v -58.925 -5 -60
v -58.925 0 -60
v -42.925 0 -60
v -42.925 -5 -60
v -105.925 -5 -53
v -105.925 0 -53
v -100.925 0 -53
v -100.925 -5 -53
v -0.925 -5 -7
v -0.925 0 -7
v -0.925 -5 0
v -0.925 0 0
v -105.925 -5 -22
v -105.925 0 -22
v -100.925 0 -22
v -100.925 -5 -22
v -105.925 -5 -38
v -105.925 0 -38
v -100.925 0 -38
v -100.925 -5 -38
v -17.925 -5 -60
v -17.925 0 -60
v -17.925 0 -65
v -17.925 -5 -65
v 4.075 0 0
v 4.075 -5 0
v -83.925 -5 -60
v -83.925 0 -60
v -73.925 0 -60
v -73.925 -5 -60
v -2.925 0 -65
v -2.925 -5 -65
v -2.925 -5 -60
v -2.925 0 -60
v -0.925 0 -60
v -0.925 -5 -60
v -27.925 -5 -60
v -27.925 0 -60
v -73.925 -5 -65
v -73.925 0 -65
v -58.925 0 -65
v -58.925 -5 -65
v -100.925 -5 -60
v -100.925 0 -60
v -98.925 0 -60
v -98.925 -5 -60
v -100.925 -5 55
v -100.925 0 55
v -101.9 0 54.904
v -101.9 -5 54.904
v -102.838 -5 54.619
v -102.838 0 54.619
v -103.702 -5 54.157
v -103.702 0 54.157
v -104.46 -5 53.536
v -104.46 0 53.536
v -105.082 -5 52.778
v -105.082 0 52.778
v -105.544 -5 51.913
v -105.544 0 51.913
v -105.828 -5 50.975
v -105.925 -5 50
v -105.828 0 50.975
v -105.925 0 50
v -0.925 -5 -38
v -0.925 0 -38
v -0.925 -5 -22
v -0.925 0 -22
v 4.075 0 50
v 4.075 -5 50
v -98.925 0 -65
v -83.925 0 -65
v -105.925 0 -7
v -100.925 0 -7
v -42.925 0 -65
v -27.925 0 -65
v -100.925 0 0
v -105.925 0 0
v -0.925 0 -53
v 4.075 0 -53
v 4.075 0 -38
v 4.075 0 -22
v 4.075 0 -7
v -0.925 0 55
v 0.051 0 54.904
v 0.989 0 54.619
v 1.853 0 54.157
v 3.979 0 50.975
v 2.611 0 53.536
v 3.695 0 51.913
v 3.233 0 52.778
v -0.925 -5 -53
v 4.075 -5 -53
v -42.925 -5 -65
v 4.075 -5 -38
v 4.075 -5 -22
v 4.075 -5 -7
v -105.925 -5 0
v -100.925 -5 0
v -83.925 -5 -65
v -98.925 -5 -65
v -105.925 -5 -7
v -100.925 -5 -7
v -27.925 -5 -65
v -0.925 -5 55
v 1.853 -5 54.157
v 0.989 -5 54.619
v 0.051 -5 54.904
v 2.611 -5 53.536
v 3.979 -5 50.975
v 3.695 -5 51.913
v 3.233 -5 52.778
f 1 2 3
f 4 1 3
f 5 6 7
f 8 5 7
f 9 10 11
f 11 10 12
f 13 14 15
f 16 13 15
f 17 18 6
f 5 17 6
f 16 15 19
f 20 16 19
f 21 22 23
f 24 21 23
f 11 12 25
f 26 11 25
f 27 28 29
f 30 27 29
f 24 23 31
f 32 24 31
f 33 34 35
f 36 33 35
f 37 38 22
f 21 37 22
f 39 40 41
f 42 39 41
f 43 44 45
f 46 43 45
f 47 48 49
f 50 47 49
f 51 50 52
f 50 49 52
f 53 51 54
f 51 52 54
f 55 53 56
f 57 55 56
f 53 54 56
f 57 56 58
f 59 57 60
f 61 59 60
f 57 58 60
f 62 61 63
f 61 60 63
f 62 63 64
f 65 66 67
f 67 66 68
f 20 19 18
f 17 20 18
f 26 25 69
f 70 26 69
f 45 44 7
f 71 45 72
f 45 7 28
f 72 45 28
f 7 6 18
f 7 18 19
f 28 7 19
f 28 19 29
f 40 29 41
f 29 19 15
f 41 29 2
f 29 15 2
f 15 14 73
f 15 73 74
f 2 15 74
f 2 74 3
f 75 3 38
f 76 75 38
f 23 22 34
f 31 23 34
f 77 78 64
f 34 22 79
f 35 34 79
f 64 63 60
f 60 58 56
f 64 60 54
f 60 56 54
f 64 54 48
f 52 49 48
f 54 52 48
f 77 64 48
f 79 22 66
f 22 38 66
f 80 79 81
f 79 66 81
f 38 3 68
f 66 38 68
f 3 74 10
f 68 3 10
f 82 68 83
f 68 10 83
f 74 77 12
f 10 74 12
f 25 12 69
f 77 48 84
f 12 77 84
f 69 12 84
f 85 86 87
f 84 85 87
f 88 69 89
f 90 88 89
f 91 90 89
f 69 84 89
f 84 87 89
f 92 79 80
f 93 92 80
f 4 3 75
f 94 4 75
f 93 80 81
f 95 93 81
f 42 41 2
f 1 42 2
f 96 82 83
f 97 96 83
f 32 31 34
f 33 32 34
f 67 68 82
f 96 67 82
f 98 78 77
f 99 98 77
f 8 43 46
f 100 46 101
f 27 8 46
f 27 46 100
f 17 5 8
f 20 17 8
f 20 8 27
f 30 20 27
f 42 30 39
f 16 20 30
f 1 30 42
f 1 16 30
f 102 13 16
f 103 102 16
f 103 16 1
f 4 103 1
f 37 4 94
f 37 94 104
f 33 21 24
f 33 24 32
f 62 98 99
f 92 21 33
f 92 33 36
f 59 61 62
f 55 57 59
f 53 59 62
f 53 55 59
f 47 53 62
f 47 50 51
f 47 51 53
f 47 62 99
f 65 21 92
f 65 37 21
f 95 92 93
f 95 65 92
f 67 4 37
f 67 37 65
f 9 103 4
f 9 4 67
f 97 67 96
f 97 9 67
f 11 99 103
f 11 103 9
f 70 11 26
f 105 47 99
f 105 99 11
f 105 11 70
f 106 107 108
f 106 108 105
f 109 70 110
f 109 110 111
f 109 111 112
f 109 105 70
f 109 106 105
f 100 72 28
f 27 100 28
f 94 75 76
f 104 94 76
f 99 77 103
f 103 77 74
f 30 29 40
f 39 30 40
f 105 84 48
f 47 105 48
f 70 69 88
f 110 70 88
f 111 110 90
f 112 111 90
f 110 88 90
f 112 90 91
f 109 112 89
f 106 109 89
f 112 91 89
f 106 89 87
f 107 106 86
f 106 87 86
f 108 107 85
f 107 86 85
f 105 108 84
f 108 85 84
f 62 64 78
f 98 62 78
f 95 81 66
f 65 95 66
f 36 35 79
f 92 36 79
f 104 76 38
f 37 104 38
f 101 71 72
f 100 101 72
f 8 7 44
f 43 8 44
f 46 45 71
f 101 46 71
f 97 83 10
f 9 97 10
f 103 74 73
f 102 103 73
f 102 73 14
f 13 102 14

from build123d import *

# Parameters (mm, degrees)
F1_DEPTH = 5
F2_DEPTH = 5
F3_DEPTH = 5


# Not quite as in the source:
# - a feature names something its author has since deleted; it is built from what else it names


with BuildPart() as f1:
    # F0 (on Front) → F1 (new body)
    with BuildSketch(Plane.XZ):
        Polygon((-50.9245342757, -5.52e-08), (-100.9245342757, -5.52e-08), (-100.9245342757, -7), (-105.9245342757, -7), (-105.924534339, -22), (-100.9245342757, -22), (-100.9245342757, -38), (-105.9245342757, -38), (-105.924534339, -53), (-100.9245342757, -53), (-100.9245342757, -60.0000000552), (-98.924534339, -60.0000000552), (-98.924534339, -65.0000000552), (-83.924534339, -65), (-83.924534339, -60.0000000552), (-73.924534339, -60.0000000552), (-73.924534339, -65.0000000552), (-58.924534339, -65), (-58.924534339, -60.0000000552), (-42.9245342757, -60.0000000552), (-42.9245342757, -65.0000000552), (-27.9245342757, -65.0000000552), (-27.9245342757, -60.0000000552), (-17.9245342757, -60.0000000552), (-17.9245342757, -65.0000000552), (-2.9245342757, -65.0000000552), (-2.9245342757, -60.0000000552), (-0.9245342757, -60.0000000552), (-0.9245342757, -53.0000000552), (4.0754657243, -53.0000000552), (4.0754657243, -38.0000000552), (-0.9245342757, -38.0000000552), (-0.9245342757, -22), (4.0754657243, -22), (4.075465661, -7), (-0.9245342757, -7), (-0.9245342757, -5.52e-08), align=None)
    extrude(amount=F1_DEPTH)

    # F0 (on Front) → F2 (join)
    with BuildSketch(Plane.XZ):
        with BuildLine():
            Line((-105.9245342757, -5.52e-08), (-100.9245342757, -5.52e-08))
            Line((-100.9245342757, -5.52e-08), (-50.9245342757, -5.52e-08))
            Line((-50.9245342757, -5.52e-08), (-0.9245342757, -5.52e-08))
            Line((-0.9245342757, -5.52e-08), (4.0754657243, -5.52e-08))
            Line((4.0754657243, -5.52e-08), (4.0754657243, 49.9999999448))
            ThreePointArc((4.0754657243, 49.9999999448), (2.6109996302, 53.5355338508), (-0.9245342757, 54.9999999448))
            Line((-0.9245342757, 54.9999999448), (-100.9245342757, 54.9999999448))
            ThreePointArc((-100.9245342757, 54.9999999448), (-104.4600681817, 53.5355338508), (-105.9245342757, 49.9999999448))
            Line((-105.9245342757, 49.9999999448), (-105.9245342757, -5.52e-08))
        make_face()
    extrude(amount=F2_DEPTH)

    # F0 (on Front) → F3 (join)
    with BuildSketch(Plane.XZ):
        with BuildLine():
            Line((-105.9245342757, -5.52e-08), (-100.9245342757, -5.52e-08))
            Line((-100.9245342757, -5.52e-08), (-50.9245342757, -5.52e-08))
            Line((-50.9245342757, -5.52e-08), (-0.9245342757, -5.52e-08))
            Line((-0.9245342757, -5.52e-08), (4.0754657243, -5.52e-08))
            Line((4.0754657243, -5.52e-08), (4.0754657243, 49.9999999448))
            ThreePointArc((4.0754657243, 49.9999999448), (2.6109996302, 53.5355338508), (-0.9245342757, 54.9999999448))
            Line((-0.9245342757, 54.9999999448), (-100.9245342757, 54.9999999448))
            ThreePointArc((-100.9245342757, 54.9999999448), (-104.4600681817, 53.5355338508), (-105.9245342757, 49.9999999448))
            Line((-105.9245342757, 49.9999999448), (-105.9245342757, -5.52e-08))
        make_face()
    extrude(amount=F3_DEPTH)


solid = f1.part
